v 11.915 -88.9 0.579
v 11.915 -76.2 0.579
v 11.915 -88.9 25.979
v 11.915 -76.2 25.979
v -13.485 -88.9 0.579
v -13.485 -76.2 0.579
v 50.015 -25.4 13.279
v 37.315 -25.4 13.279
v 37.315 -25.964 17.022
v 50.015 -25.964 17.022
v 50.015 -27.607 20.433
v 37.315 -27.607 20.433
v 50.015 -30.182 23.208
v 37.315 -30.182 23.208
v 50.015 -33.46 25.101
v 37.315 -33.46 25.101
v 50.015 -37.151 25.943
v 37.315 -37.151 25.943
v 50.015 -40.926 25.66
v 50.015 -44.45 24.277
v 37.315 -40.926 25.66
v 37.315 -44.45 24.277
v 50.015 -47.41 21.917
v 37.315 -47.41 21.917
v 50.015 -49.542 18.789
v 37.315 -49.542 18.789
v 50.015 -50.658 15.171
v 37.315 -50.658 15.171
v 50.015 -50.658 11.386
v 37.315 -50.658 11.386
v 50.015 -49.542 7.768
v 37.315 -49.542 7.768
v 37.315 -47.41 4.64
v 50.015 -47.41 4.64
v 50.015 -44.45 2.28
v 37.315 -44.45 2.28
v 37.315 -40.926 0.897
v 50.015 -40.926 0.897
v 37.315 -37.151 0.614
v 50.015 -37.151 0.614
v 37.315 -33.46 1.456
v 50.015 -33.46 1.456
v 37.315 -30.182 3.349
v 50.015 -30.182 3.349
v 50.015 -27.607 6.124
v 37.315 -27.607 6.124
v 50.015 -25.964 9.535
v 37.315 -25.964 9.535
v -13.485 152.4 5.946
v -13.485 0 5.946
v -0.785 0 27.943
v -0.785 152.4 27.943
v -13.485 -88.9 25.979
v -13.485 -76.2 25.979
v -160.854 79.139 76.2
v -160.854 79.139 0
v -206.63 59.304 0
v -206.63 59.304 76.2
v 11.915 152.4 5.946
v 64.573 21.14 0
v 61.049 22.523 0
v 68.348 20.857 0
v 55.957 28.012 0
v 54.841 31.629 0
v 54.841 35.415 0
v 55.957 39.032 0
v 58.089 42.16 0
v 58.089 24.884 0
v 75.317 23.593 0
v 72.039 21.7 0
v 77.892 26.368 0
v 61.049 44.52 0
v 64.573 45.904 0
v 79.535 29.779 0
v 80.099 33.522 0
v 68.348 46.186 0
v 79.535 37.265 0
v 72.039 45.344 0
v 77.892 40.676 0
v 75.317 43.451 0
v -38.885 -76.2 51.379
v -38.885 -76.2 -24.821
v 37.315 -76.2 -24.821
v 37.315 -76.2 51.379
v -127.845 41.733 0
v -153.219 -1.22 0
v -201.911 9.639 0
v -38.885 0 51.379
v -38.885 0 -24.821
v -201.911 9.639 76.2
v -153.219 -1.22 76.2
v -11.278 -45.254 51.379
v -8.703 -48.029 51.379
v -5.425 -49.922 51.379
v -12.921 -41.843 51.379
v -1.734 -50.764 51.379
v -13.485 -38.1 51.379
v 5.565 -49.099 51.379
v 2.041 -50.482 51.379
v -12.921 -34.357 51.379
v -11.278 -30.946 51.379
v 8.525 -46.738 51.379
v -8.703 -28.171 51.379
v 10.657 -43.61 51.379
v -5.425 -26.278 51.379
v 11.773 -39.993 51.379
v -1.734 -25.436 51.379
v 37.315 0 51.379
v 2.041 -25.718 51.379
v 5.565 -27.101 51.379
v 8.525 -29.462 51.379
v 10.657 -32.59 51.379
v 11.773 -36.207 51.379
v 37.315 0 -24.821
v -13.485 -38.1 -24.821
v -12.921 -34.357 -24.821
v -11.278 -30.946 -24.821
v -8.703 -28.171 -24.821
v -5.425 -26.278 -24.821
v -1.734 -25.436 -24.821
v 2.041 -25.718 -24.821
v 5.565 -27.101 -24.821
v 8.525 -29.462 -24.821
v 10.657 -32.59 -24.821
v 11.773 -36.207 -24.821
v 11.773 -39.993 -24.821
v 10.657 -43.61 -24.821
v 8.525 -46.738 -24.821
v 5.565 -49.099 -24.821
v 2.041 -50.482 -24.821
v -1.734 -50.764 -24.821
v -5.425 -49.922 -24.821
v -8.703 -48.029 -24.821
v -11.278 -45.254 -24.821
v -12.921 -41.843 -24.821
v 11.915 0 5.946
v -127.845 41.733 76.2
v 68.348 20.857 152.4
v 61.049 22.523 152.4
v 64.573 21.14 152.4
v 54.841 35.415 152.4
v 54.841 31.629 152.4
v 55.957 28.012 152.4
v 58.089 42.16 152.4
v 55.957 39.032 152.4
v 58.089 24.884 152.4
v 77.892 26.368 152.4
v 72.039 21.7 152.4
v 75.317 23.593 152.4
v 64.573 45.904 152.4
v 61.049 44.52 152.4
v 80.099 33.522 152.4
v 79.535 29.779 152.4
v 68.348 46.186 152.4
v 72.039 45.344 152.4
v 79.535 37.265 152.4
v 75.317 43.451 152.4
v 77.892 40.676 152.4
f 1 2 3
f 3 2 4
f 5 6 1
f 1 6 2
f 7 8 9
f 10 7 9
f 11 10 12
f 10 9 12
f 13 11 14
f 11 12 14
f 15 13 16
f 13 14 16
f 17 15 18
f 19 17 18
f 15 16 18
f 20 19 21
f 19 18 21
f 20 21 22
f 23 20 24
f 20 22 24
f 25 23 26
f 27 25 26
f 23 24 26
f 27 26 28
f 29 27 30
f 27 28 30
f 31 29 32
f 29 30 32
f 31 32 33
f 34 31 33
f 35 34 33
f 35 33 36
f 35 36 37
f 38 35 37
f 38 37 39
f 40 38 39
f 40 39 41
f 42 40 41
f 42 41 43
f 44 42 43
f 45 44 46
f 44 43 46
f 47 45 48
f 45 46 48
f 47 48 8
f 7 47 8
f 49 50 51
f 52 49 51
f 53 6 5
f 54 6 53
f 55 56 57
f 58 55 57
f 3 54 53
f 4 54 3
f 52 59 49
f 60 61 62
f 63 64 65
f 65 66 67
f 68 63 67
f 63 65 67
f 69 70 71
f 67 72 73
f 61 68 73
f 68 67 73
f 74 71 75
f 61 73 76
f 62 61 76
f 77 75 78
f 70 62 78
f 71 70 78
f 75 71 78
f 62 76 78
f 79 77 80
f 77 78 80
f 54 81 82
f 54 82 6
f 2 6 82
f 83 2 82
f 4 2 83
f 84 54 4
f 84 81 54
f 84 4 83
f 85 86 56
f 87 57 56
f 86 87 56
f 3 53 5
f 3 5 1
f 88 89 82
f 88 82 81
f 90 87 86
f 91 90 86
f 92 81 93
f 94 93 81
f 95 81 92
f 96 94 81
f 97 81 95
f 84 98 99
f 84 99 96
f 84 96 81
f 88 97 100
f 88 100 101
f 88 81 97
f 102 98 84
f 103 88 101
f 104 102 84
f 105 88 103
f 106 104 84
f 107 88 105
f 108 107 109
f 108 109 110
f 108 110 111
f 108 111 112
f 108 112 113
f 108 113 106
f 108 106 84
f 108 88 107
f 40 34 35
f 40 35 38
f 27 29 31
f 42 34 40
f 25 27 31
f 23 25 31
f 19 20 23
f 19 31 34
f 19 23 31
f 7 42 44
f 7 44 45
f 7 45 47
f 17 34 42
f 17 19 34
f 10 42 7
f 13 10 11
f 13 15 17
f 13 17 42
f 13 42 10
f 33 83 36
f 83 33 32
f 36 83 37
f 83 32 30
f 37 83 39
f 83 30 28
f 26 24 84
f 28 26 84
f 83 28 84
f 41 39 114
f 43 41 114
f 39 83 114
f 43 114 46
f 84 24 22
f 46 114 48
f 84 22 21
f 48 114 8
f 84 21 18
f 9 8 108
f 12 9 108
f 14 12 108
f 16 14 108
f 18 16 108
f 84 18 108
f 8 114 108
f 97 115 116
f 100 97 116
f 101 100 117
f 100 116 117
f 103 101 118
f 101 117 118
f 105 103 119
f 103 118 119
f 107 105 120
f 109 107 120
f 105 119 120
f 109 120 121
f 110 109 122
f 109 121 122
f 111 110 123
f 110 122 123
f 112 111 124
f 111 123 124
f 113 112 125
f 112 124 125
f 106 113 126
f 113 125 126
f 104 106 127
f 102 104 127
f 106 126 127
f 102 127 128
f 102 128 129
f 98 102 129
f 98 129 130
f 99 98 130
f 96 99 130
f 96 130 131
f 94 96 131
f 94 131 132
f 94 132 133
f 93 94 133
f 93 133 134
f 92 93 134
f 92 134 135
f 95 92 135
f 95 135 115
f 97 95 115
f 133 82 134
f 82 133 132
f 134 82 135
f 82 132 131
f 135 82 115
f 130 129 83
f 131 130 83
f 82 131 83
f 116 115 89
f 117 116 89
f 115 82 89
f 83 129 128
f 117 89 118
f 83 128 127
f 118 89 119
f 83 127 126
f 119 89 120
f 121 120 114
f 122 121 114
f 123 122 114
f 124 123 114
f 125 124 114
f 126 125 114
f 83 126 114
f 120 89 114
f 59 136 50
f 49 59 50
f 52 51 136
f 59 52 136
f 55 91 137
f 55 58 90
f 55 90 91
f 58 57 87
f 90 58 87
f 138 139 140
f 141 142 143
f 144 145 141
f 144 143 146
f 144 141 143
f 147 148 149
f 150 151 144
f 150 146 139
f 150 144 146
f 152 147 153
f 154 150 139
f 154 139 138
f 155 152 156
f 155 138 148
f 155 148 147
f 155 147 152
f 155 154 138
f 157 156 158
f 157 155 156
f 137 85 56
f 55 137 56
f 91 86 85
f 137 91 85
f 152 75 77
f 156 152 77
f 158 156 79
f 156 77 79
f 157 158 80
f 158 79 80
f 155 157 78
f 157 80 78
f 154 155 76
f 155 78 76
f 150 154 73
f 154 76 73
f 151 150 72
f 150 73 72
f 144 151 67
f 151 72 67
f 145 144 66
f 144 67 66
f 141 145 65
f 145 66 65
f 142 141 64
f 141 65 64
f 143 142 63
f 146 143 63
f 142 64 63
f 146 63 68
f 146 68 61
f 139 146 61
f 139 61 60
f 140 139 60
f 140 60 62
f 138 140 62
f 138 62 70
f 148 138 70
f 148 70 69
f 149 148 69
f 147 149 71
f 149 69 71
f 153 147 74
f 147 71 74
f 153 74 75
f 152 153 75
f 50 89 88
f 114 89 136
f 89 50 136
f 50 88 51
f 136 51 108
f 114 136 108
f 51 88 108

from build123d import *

# Parameters (mm, degrees)
F0_W      = 76.2
F0_H      = 76.2
F1_DEPTH  = 76.2
F3_D      = 25.4
F4_W      = 25.4
F4_H      = 25.4
F5_DEPTH  = 12.7
F6_R      = 12.7
F7_DEPTH  = 12.7
F9_DEPTH  = 152.4
F10_R     = 12.7
F11_DEPTH = 152.4
F13_DEPTH = 76.2


with BuildPart() as f1:
    # F0 (on Front) → F1 (new body)
    with BuildSketch(Plane.XZ):
        with Locations((-0.785079, 13.278581)):
            Rectangle(F0_W, F0_H)
    extrude(amount=F1_DEPTH)

    # F3 (through all)
    with Locations(Plane.XY.offset(51.378581)):
        with Locations((-0.785079, -38.1)):
            Hole(F3_D / 2)

    # F4 (on face) → F5 (join)
    with BuildSketch(Plane.XZ.offset(76.2)):
        with Locations((-0.785079, 13.278581)):
            Rectangle(F4_W, F4_H)
    extrude(amount=F5_DEPTH)

    # F6 (on face) → F7 (join)
    with BuildSketch(Plane.YZ.offset(37.314921)):
        with Locations((-38.1, 13.278581)):
            Circle(F6_R)
    extrude(amount=F7_DEPTH)

    # F8 (on face) → F9 (join)
    with BuildSketch(Plane(origin=(0, 0, 0), x_dir=(-1, 0, 0), z_dir=(0, 1, 0))):
        Polygon((0.785079, 27.943278), (-11.914921, 5.946233), (13.485079, 5.946233), align=None)
    extrude(amount=F9_DEPTH)


with BuildPart() as f11:
    # F10 (on Top) → F11 (new body)
    with BuildSketch(Plane.XY):
        with Locations((67.399062, 33.521928)):
            Circle(F10_R)
    extrude(amount=F11_DEPTH)


with BuildPart() as f13:
    # F12 (on Top) → F13 (new body)
    with BuildSketch(Plane.XY):
        Polygon((-153.219321, -1.220047), (-127.844832, 41.732866), (-160.854331, 79.138618), (-206.629812, 59.303733), (-201.911116, 9.639346), align=None)
    extrude(amount=F13_DEPTH)


solid = Compound([f1.part, f11.part, f13.part])
